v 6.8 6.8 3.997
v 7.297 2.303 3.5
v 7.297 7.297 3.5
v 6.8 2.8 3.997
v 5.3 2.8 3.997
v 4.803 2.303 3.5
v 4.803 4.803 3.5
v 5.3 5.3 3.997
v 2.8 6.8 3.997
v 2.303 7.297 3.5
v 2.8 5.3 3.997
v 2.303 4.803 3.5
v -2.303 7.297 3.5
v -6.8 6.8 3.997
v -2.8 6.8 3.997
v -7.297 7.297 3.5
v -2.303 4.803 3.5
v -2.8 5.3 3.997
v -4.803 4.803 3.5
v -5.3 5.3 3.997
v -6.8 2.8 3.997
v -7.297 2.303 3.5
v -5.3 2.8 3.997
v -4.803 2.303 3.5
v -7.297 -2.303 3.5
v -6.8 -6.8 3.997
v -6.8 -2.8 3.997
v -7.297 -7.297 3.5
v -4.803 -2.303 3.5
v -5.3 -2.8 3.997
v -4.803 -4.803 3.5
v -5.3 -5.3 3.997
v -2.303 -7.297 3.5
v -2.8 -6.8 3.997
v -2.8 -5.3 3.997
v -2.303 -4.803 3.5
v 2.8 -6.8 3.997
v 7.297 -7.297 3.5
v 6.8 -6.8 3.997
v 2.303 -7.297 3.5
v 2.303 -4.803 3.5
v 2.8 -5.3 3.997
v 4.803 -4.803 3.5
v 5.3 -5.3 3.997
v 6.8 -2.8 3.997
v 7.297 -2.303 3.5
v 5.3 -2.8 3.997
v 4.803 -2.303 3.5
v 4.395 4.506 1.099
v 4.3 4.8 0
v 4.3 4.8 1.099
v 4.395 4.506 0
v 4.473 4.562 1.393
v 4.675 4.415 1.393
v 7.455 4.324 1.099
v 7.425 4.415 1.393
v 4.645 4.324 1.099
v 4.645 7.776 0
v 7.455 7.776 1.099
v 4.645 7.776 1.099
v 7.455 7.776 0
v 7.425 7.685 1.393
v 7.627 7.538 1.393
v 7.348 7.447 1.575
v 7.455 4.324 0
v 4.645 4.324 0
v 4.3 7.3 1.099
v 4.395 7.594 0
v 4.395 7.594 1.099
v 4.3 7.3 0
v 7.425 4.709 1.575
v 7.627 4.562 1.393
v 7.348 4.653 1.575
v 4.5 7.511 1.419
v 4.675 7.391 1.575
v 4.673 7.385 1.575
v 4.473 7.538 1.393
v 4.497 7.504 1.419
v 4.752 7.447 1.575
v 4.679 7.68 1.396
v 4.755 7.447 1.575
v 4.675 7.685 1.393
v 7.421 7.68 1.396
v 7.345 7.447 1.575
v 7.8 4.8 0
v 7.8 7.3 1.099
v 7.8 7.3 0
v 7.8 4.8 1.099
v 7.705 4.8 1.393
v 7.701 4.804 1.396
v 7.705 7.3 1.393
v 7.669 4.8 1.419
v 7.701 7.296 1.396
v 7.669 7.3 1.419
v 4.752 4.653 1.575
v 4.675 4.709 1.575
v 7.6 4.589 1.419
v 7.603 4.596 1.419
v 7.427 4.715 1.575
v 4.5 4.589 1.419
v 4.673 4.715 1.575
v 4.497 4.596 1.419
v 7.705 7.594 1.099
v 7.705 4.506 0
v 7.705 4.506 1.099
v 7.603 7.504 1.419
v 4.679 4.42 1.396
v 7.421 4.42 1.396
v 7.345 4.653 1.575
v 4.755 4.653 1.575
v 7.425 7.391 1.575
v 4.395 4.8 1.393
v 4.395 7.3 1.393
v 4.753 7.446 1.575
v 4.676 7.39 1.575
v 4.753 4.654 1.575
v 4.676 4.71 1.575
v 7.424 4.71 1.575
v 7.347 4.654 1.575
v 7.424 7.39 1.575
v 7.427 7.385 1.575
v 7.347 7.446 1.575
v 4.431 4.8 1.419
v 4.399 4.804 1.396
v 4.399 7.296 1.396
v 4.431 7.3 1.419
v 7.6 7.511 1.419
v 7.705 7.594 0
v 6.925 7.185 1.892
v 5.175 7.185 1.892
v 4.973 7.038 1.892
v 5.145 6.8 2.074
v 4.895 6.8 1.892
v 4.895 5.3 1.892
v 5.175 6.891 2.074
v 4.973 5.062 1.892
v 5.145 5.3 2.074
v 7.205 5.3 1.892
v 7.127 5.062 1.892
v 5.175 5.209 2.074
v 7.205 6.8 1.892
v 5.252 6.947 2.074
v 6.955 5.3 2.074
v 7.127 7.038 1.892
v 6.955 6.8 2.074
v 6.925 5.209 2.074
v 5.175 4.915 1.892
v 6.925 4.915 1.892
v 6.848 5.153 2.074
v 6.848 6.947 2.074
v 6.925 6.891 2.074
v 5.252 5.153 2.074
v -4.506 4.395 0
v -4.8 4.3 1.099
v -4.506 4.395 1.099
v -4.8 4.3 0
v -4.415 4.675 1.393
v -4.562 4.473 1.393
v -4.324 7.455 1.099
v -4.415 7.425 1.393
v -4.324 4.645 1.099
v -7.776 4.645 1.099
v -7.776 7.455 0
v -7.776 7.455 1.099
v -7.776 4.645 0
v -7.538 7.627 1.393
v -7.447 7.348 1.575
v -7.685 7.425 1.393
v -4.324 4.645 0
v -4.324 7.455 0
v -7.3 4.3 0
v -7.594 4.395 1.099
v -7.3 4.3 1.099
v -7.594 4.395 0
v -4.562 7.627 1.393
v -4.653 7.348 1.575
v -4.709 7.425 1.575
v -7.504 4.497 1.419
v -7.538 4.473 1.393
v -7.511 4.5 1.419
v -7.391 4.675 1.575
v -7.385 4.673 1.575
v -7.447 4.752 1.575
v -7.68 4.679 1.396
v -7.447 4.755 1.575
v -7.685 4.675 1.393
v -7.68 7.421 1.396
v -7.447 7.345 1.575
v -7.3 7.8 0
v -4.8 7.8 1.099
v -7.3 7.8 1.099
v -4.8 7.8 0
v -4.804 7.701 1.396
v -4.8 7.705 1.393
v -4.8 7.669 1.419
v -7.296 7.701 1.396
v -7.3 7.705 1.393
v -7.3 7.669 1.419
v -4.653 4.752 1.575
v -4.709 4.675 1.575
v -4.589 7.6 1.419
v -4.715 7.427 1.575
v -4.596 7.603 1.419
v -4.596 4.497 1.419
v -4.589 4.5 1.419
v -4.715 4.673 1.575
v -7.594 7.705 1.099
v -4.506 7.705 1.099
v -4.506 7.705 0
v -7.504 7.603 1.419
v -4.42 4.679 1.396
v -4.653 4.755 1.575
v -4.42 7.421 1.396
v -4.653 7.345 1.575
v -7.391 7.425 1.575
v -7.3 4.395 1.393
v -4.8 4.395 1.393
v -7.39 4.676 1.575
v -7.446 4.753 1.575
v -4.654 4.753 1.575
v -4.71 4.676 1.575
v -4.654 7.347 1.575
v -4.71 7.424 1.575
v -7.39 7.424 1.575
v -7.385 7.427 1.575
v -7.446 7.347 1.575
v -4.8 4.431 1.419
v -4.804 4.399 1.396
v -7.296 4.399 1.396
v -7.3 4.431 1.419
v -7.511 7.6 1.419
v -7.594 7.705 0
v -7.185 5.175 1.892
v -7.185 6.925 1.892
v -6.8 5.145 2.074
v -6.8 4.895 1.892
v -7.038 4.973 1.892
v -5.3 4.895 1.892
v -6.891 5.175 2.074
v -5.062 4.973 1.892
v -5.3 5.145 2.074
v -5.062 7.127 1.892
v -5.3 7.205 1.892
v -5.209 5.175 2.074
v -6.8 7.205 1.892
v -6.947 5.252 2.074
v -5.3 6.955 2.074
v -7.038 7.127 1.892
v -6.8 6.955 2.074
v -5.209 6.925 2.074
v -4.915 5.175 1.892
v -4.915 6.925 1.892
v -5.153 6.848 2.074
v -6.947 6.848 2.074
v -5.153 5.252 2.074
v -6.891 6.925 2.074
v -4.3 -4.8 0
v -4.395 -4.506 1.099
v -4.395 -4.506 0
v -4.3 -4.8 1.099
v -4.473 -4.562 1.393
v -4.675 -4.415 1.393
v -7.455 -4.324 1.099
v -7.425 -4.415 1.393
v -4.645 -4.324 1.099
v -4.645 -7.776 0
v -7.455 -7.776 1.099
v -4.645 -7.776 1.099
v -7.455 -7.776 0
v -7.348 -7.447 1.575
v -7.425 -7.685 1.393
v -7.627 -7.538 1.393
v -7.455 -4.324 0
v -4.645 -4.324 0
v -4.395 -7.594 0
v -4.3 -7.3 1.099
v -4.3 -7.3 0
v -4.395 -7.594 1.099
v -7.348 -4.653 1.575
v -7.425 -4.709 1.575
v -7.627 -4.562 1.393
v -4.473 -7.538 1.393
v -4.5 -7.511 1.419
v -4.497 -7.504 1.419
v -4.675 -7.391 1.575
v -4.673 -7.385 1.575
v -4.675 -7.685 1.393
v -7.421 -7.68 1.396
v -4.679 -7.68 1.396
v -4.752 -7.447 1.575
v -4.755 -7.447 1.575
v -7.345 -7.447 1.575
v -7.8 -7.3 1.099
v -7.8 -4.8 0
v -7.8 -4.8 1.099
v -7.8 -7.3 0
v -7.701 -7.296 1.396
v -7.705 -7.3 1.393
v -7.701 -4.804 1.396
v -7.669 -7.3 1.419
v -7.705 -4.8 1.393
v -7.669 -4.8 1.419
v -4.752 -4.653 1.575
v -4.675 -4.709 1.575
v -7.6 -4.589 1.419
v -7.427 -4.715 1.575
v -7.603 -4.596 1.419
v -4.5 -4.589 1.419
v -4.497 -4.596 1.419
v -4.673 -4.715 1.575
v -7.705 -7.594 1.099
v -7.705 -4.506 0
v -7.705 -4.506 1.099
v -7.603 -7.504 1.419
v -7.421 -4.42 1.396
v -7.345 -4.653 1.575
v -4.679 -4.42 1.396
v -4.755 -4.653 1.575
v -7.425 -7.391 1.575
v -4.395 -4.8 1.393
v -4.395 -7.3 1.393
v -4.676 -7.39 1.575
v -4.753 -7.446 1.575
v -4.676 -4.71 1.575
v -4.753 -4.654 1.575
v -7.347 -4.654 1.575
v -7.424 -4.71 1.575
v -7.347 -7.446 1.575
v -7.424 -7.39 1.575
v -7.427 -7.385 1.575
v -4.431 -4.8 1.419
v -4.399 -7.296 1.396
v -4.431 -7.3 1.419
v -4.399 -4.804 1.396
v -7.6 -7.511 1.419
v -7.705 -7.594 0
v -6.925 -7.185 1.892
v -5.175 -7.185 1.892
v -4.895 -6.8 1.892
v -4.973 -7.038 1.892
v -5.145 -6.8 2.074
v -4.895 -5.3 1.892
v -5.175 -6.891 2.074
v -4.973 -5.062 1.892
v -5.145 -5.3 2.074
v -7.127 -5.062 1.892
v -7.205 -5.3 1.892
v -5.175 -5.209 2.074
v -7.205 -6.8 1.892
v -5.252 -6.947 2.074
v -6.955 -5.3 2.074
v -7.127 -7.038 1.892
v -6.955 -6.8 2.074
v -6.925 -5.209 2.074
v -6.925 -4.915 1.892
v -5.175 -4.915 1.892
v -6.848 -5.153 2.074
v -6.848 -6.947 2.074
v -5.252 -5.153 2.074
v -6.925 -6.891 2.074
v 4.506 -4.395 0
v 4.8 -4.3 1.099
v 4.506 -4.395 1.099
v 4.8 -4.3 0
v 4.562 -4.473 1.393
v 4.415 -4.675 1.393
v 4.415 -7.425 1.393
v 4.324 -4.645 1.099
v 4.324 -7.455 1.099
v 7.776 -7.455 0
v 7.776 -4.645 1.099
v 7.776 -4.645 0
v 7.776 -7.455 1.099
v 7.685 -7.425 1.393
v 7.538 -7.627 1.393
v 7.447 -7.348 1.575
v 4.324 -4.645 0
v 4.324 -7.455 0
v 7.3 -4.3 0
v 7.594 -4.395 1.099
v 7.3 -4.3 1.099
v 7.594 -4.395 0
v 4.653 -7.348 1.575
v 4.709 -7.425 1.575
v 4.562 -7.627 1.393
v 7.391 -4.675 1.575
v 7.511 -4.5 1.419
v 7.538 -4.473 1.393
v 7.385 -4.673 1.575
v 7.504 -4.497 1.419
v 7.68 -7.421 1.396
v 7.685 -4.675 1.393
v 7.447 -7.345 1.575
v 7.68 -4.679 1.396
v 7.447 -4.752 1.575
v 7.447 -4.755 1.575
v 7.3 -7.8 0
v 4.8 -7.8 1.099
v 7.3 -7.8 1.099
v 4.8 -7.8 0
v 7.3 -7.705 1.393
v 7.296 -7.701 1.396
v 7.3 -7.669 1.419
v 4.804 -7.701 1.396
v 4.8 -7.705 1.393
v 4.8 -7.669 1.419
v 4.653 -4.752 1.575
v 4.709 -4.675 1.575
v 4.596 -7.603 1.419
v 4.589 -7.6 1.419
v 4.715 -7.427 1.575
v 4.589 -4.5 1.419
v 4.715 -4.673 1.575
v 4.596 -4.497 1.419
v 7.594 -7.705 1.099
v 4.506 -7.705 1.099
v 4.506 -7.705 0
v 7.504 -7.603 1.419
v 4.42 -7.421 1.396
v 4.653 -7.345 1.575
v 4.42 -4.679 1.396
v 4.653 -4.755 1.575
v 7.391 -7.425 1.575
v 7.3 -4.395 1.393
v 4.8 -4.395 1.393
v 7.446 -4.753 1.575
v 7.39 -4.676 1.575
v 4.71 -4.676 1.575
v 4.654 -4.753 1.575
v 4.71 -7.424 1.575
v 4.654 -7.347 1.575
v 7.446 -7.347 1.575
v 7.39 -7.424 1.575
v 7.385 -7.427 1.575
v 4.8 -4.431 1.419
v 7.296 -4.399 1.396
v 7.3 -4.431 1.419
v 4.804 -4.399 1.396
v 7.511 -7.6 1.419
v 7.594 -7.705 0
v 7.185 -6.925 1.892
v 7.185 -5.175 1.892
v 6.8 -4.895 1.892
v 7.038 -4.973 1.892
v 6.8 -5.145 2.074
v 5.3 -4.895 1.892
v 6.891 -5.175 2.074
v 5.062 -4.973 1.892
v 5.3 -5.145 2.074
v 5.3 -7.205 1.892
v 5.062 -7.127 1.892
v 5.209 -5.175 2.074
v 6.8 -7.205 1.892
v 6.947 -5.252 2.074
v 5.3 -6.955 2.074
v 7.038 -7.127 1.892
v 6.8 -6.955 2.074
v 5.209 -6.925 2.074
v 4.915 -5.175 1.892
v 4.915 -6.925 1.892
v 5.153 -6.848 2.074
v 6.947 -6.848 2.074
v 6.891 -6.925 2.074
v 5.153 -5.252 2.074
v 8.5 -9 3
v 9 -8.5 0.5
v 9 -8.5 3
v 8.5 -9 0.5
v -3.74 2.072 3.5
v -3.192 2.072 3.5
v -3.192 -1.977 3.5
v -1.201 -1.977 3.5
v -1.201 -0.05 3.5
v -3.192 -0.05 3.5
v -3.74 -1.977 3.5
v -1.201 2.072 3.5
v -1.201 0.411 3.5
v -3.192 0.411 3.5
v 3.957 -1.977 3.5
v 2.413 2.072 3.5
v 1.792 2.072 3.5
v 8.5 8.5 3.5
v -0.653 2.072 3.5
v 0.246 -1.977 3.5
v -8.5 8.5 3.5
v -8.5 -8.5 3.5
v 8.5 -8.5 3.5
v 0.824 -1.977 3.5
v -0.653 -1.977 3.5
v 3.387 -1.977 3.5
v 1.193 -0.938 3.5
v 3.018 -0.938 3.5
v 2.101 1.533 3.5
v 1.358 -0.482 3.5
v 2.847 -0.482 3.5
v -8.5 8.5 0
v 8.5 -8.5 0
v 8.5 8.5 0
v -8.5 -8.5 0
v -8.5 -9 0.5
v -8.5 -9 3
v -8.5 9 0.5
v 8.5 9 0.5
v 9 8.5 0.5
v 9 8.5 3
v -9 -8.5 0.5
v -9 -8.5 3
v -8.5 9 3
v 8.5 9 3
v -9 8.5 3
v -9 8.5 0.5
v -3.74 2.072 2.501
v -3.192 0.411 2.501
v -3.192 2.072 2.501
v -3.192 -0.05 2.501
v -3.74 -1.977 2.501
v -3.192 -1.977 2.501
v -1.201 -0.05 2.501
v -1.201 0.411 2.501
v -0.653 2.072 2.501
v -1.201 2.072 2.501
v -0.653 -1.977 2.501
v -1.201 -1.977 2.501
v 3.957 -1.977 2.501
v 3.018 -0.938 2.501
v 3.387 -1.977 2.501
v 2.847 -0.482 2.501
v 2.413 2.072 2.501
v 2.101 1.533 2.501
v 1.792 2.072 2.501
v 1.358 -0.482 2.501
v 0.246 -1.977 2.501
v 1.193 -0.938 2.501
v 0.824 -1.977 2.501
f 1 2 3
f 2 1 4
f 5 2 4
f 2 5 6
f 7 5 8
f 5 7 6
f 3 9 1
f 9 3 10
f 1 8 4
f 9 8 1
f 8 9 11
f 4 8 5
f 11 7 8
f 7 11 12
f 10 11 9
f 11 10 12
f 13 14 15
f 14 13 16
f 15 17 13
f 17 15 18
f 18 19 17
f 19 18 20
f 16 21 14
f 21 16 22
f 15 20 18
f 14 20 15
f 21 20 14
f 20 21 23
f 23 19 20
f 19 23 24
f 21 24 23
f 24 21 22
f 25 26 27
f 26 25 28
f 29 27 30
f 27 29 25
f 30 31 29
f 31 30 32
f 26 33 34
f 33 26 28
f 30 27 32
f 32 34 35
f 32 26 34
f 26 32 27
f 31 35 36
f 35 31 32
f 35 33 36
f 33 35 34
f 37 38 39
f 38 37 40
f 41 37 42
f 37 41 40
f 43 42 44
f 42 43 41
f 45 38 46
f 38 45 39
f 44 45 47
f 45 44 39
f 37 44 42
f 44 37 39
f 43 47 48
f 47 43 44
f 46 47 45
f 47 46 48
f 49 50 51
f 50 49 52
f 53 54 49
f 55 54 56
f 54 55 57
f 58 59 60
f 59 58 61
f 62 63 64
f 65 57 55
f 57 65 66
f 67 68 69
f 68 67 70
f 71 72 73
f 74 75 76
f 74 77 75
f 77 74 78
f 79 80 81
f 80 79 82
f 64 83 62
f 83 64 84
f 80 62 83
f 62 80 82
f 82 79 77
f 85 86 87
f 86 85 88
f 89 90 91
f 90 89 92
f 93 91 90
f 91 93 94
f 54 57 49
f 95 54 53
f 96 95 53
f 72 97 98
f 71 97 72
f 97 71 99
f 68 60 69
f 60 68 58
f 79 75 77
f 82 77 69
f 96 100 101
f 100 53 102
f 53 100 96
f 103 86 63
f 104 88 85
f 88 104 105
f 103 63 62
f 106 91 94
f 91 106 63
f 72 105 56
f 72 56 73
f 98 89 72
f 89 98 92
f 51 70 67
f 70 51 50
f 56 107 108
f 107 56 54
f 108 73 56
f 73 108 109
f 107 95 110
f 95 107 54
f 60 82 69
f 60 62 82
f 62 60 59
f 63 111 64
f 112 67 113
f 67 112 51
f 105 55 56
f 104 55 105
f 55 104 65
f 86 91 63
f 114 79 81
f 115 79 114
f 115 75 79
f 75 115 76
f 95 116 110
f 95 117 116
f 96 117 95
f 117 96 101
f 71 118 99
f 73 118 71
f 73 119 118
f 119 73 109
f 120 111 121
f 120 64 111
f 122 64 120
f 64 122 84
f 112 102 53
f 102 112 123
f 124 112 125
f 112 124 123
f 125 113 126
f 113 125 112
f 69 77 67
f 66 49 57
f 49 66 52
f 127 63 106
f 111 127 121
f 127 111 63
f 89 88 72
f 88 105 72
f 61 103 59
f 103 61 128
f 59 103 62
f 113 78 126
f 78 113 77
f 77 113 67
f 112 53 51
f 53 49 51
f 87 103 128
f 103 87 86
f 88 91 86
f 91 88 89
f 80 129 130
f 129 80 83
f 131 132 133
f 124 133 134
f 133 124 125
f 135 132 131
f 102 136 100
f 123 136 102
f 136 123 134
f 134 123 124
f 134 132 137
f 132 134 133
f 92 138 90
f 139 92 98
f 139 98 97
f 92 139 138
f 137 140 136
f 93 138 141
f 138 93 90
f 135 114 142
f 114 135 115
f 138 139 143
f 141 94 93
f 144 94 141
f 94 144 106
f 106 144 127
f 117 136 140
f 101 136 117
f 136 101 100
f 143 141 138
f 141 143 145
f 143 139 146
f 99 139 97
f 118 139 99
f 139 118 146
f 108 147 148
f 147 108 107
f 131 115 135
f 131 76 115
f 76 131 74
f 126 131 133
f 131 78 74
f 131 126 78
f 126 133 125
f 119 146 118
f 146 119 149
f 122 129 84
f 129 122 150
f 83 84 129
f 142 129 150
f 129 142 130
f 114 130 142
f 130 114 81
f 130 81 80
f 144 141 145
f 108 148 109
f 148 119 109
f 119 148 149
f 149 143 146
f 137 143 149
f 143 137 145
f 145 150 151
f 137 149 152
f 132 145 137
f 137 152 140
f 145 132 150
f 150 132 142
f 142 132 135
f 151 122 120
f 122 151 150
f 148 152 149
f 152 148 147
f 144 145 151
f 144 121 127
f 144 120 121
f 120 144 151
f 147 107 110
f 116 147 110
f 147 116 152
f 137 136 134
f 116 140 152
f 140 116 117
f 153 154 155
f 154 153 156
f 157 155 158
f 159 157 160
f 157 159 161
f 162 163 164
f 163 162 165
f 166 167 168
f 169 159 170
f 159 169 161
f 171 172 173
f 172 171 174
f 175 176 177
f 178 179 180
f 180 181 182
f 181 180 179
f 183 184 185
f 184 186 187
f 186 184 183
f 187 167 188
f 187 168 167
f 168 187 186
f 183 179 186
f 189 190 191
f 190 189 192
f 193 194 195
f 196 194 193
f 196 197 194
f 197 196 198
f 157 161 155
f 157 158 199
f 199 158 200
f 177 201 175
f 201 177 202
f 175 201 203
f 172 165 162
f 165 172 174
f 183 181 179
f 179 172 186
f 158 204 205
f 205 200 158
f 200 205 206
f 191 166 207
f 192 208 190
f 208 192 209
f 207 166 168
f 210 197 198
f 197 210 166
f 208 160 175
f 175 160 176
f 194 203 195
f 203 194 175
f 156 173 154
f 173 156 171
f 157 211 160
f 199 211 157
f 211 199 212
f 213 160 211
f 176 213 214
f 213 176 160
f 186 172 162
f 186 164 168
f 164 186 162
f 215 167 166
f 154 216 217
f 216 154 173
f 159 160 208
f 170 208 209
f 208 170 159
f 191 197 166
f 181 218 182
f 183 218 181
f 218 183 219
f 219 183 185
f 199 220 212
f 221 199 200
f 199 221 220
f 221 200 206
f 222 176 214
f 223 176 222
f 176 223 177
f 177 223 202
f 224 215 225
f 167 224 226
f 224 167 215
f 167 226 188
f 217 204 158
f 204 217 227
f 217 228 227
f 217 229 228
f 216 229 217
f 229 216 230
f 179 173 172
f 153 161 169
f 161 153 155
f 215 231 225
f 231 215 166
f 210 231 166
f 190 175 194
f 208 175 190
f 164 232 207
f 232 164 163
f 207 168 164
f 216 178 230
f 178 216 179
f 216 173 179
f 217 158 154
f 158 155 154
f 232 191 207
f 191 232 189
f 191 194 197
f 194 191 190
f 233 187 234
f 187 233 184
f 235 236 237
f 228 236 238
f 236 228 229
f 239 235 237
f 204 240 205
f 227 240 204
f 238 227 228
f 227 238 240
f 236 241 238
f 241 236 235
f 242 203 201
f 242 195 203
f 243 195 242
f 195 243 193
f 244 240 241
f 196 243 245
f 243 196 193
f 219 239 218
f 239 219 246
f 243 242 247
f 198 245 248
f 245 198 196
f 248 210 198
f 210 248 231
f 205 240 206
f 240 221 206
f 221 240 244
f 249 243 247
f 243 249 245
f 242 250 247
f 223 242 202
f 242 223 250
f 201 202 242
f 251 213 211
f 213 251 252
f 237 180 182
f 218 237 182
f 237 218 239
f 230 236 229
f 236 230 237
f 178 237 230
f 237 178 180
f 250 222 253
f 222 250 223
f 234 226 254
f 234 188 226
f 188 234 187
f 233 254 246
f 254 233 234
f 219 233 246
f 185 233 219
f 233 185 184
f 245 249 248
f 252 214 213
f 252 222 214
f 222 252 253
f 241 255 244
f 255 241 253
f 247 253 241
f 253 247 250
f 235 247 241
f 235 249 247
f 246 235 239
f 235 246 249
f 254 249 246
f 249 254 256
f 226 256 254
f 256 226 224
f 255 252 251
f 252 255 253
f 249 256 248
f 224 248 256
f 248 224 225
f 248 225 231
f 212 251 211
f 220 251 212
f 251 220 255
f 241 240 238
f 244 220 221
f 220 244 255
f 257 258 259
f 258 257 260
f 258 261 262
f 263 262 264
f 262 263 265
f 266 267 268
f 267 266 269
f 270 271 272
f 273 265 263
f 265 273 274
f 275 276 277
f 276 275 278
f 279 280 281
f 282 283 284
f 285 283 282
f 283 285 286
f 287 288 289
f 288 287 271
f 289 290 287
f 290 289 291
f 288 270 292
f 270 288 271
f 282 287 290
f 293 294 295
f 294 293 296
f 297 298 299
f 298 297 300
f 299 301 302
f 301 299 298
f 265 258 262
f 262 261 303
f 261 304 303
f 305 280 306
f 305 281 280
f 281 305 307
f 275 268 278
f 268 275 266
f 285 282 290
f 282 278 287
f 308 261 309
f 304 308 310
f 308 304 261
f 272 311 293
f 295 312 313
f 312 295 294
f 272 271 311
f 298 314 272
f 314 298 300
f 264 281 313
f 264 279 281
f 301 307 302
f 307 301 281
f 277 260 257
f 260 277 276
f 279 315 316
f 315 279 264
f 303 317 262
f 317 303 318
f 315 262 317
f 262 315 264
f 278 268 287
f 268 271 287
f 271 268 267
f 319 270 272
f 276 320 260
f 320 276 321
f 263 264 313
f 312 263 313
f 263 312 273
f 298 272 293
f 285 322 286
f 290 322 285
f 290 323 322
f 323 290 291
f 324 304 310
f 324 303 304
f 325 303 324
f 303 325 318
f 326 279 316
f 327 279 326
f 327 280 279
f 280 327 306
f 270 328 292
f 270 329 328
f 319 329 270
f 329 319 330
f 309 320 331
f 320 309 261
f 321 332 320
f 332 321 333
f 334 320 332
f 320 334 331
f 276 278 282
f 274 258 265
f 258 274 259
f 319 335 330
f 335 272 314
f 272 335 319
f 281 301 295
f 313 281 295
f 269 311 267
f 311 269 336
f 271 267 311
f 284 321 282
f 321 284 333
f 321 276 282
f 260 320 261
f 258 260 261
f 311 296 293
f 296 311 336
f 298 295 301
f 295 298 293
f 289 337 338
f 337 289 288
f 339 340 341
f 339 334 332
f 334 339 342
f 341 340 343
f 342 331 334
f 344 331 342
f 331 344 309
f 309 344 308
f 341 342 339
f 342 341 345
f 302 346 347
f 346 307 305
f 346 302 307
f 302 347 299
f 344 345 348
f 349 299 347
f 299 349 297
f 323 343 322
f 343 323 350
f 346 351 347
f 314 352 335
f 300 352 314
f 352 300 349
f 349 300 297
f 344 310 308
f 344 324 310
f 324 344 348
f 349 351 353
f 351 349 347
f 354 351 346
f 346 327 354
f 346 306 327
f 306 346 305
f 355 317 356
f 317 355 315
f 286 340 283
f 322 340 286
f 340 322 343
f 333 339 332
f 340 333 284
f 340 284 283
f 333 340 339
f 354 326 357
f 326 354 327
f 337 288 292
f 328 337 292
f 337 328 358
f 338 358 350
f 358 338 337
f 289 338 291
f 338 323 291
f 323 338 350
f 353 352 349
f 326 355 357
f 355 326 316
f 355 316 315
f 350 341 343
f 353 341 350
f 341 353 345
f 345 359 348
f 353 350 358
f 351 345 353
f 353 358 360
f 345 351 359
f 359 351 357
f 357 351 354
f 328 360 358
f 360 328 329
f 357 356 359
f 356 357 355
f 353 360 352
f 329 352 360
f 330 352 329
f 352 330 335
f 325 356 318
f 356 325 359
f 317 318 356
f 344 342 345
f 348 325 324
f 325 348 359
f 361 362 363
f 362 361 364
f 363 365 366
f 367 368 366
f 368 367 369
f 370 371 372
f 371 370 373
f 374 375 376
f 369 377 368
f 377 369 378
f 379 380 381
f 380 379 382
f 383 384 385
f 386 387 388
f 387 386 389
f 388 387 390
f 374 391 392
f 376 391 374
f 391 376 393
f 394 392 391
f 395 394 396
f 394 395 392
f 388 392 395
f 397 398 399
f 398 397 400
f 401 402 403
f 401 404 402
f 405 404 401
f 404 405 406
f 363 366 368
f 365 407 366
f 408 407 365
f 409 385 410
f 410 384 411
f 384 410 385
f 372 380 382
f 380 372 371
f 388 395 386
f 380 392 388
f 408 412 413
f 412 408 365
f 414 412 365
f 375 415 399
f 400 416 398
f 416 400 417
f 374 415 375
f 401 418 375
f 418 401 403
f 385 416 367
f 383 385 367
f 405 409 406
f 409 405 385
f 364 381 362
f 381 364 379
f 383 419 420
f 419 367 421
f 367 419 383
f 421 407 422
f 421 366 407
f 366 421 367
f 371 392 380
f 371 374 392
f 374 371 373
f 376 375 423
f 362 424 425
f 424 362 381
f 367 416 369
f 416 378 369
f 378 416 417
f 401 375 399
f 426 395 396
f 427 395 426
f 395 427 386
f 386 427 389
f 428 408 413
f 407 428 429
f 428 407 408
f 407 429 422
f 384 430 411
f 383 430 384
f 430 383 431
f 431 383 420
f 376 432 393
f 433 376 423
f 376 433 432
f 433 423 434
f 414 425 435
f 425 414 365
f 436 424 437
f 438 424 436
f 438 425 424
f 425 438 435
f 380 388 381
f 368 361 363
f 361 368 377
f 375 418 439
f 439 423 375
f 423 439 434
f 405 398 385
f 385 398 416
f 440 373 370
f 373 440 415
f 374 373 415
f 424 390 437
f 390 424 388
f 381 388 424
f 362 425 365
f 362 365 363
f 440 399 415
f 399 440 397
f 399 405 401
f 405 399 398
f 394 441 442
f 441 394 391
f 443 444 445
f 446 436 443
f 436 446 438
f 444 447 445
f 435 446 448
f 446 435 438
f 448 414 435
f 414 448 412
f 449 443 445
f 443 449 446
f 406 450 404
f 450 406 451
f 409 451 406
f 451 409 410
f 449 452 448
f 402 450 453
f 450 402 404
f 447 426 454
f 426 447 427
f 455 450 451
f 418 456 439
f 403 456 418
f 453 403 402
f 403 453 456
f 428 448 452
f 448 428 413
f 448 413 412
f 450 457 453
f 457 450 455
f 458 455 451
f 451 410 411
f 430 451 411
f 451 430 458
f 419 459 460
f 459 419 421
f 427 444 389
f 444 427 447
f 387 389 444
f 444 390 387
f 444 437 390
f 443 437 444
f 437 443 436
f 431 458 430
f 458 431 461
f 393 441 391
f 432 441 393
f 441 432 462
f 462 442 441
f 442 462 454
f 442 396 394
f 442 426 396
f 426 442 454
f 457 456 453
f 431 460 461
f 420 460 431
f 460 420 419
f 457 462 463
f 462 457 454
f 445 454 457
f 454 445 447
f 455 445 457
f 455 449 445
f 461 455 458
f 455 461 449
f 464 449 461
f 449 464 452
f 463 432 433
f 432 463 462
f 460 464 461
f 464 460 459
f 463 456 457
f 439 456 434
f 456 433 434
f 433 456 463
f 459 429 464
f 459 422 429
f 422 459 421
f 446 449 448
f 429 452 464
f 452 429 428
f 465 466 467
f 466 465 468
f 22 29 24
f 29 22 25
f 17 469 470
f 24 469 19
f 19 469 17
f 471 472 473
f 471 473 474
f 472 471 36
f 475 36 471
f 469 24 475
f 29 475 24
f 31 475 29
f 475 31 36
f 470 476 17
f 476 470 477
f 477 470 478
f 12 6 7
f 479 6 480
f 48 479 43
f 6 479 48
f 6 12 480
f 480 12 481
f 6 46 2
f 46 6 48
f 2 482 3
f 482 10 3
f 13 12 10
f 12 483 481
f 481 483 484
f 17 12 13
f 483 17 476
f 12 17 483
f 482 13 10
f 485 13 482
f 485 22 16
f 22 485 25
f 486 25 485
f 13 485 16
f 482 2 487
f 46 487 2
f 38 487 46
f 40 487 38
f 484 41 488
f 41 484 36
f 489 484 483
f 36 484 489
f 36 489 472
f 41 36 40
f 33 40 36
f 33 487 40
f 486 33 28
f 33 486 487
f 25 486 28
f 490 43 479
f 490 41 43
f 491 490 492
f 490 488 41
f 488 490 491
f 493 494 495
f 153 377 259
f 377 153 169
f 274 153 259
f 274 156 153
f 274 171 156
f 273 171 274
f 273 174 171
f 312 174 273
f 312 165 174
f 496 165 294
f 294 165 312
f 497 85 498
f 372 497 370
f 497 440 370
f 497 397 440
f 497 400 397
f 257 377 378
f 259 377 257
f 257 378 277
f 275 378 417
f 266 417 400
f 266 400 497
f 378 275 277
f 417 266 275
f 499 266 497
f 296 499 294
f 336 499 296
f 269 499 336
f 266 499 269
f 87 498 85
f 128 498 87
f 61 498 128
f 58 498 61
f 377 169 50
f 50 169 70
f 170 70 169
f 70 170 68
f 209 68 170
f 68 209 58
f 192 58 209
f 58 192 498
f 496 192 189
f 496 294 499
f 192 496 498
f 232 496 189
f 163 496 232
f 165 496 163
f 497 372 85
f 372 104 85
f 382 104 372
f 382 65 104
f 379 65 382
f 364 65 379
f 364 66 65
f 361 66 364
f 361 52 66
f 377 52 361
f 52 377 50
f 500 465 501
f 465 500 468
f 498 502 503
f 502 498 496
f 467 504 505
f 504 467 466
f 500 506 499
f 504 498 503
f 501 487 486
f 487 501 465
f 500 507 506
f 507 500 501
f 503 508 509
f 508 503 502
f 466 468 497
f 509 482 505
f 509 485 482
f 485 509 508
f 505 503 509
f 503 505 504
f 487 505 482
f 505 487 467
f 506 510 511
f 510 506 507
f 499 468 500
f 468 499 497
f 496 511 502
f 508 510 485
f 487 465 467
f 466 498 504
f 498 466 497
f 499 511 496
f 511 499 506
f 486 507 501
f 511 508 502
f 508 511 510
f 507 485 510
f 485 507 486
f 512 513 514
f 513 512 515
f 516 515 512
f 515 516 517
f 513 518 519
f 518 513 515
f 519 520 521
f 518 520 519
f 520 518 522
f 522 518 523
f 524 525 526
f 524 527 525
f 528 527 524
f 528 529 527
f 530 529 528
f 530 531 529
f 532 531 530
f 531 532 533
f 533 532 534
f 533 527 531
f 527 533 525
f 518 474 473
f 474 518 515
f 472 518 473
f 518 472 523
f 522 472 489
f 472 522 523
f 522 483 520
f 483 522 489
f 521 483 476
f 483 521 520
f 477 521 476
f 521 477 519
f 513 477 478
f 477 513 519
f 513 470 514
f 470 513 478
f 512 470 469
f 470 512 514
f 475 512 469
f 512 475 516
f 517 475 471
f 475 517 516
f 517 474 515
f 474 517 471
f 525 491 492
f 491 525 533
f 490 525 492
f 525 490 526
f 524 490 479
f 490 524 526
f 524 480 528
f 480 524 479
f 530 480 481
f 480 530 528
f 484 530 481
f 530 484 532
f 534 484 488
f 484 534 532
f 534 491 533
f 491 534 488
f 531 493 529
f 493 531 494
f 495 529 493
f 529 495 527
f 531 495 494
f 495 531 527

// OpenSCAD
// file: common.scad
// Unless otherwise specified, each resulting shape is
// resting on the XY plane, centered on the Z axis.

// A small amount to make sure shapes overlap when needed. This
// is well below the resolution of my 3D printer, so it
// shouldn't affect the final result.
eps = 0.001;

// High quality for printing.
$fa = 5;
$fs = 0.4;

module repeatx(n, spacing) {
  for (i = [1:n])
    translate([(i-1)*spacing, 0, 0])
      children();
}

module repeaty(n, spacing) {
  for (i = [1:n])
    translate([0, (i-1)*spacing, 0])
      children();
}

// A square pyramid, 1mm wide and 0.5mm tall. Each side of
// the base is centered on an axis.
module pyramid() {
  linear_extrude(0.5, scale=0)
    square(1, center=true);
}

// A regular octahedron centered on the origin with its
// vertices on the axes. 'axis' gives its full length along
// each axis.
module octahedron(axis) {
  // Top and bottom halves.
  for (a = [-1, 1])
    scale([1, 1, a])
      // Extrude a square into a pyramid.
      linear_extrude(axis/2, scale=0)
        rotate([0, 0, 45])
          square(norm([axis/2, axis/2]), center=true);
}

// 'd' is the outer dimensions of the box.
module chamfered_box(d) {
  chamfer = 0.5;
  assert(d.x >= chamfer*2);
  assert(d.y >= chamfer*2);
  assert(d.z >= chamfer*2);

  // Raise the result up so it is resting on the XY plane.
  translate([0, 0, d.z/2]) {
    minkowski() {
      // The desired cube, scaled back by the chamfer distance
      // in all directions.
      cube(d - [chamfer*2, chamfer*2, chamfer*2], center=true);
      octahedron(chamfer*2);
    }
  }
}

module chamfered_disk(height, radius) {
  // Chamfer base disks and chips more aggressively.
  chamfer = 1.1;
  assert(radius >= chamfer);
  assert(height >= chamfer*2);

  // Raise the result up so it is resting on the XY plane.
  translate([0, 0, height/2]) {
    minkowski() {
      // The desired disk, scaled back by the chamfer distance
      // in all directions.
      cylinder(height-chamfer*2, r=radius-chamfer, center=true);
      octahedron(chamfer*2);
    }
  }
}

locking_lug_dims = [2.3, 2.3, 1.8+2*eps];

// A snug fit for gluing.
module locking_lug() {
  // Taper the lug slightly, to counteract the printing effect
  // which spreads the top layer slightly.
  linear_extrude(locking_lug_dims.z, scale=0.95)
    square([locking_lug_dims.x, locking_lug_dims.y],
            center=true);
}

// Make extra sure the lug will fit all the way into the hole.
locking_socket_extra_depth = 0.7;

module locking_socket_top() {
  translate([
    0, 0,
    -(locking_lug_dims.z+locking_socket_extra_depth)/2+eps
  ]) {
    cube(locking_lug_dims + [
      0.15, 0.15,
      locking_socket_extra_depth
    ], center=true);
  }
}

module locking_socket_bottom() {
  translate([
    0, 0,
    (locking_lug_dims.z+locking_socket_extra_depth)/2-eps
  ]) {
    cube(locking_lug_dims + [
      // When printing this on the bottom of a model, it
      // needs to be a bit wider to account for
      // elephant-foot.
      0.3, 0.3,
      locking_socket_extra_depth
    ], center=true);
  }
}

// A pin which can be used to join two locking sockets.
module locking_pin() {
  dims = [
    locking_lug_dims.x-0.2,
    // Lay the pin on its side for more reliable printing.
    locking_lug_dims.z*2 + locking_socket_extra_depth/2,
    locking_lug_dims.y-0.2,
  ];
  translate([0, 0, dims.z/2])
    cube(dims, center=true);
}
// main file
include <common.scad>

// Studs are 1.6mm high and 2.5mm across.
stud_width = 2.5;

// Studs are spaced 1.7mm in from the edges of an 18x18mm
// square.
stud_inset = 1.7;

// 45 degree beveled top, 0.5mm high.
module stud_top(dims) {
  hull() {
    for (a = [-1, 1], b = [-1, 1]) {
      translate([
        a*(dims.x/2-0.5), b*(dims.y/2-0.5), 0
      ]) {
        pyramid();
      }
    }
  }
}

module stud_piece(dims, column_height) {
  assert(dims.x >= 1);
  assert(dims.y >= 1);
  
  // Rectangular column.
  translate([0, 0, -eps])
    linear_extrude(column_height)
      square(dims, center=true);
  
  // Beveled top.
  translate([0, 0, column_height-2*eps])
    stud_top(dims);
  
  // Beveled bottom, in case any material under the stud
  // is etched away (by the face mask, for instance).
  scale([1, 1, -1])
    stud_top(dims);
}

NO_STUD = 0;
SMALL_STUD = 1;
SMALL_SHORT_STUD = 2;
LARGE_STUD = 3;
LARGE_SHORT_STUD = 4;

module stud(type=NO_STUD) {
  if (type == NO_STUD) {
    // Nothing.
    
  } else if (type == SMALL_STUD ||
             type == SMALL_SHORT_STUD) {
    c = type == SMALL_STUD ? 1.1 : 0;
    stud_piece([stud_width, stud_width], c);
    
  } else if (type == LARGE_STUD ||
             type == LARGE_SHORT_STUD) {
    c = type == LARGE_STUD ? 1.1 : 0;

    // Build an L-shaped stud out of two elongated pieces.
    translate([0, -stud_width/2, 0])
      stud_piece([stud_width, stud_width*2], c);
    translate([-stud_width/2, 0, 0])
      stud_piece([stud_width*2, stud_width], c);
    
  } else {
    assert(false, "bad stud type");
  }
}

module four_studs() {
  displacement = (18/2)-(stud_width/2)-stud_inset;  
  for (a = [0:3])
    rotate([0, 0, a*90])
      translate([displacement, displacement, 0])
        children();
}

// A stackable box, 18x18mm, with optional studs and holes.
module stackable_box(
  height, stud_type=NO_STUD, hole_type=NO_STUD
) {
  translate([0, 0, height - eps]) {
    four_studs()
      stud(stud_type);
  }

  difference() {
    chamfered_box([18, 18, height]);
    
    if (hole_type != NO_STUD) {
      four_studs() {
        // This check is required because minkowski() returns
        // a nonempty result if just one of its arguments is
        // empty.
        minkowski() {
          stud(hole_type);
          sphere(r=0.5, $fn=10);
        }
      }
    }
  }
}

// A head, which is intended to have 2 chips stacked on top.
module head(face_raster) {
  difference() {
    // A 10mm head plus two 3.5mm chips comes to 17mm,
    // which is slightly less than the 18mm width. That's
    // by design. It looks better not to have such tall 
    // heads, perhaps because the studs on top give the
    // illusion of added height.
    chamfered_box([18, 18, 10]);
    
    // Bring the mask out a bit extra to avoid having it 
    // intersect the studs at all.
    translate([0, -9, 0])
      face(face_raster);
    
    // A socket for gluing to a body.
    locking_socket_bottom();
  }
  
  // Add the studs separately, so they are not gouged by
  // the face engraving.
  translate([0, 0, 10 - eps]) {
    four_studs()
      stud(SMALL_STUD);
  }
}

// 'raster' is an array of 5 rows, where each row has 8
// elements. Each element should be in [0, 1]. A '1' means the
// given position will be fully engraved on the face.
// Returns a mask which should be subtracted from the head.
// The Z axis will coincide with the centerline of the 
// mask's front.
module face(raster) {
  // Below we use a unit of 1 to represent one pixel on
  // the face. Scale up to an 18mm face, 8 pixels wide.
  scale([2.25, 2.25, 2.25]) {
    translate([-4, -eps, -eps]) {
      difference() {
        // Begin with a filled-in face plate.
        translate([-eps, -eps, -eps])
          cube([8+2*eps, 0.9+2*eps, 5+2*eps]);
        
        // Subtract the material which needs to remain on the
        // head. Leave some support under each shelf.
        for (r = [0:4])
          for (c = [0:7])
            translate([c-eps, raster[r][c]-eps, 4-r-eps])
              rotate([90, 0, 90])
                translate([0, 0, -2*eps])
                  linear_extrude(1+4*eps)
                    polygon([
                      [   -2*eps,     -2*eps],
                      [0.9+2*eps, -0.5-2*eps],
                      [0.9+2*eps,    1+2*eps],
                      [   -2*eps,    1+2*eps],
                    ]);
      }
    }
  }
}

module text_engrave(s) {
  depth = 1;
  translate([0, 0, -depth+eps])
    linear_extrude(depth)
      text(
        text=s,
        size=4,
        font="DejaVu Sans",
        halign="center",
        valign="center",
        spacing=1.1);
}

module creeper_head() {
  head([
    [0, 1, 1, 0, 0, 1, 1, 0],
    [0, 1, 1, 0, 0, 1, 1, 0],
    [0, 0, 0, 1, 1, 0, 0, 0],
    [0, 0, 1, 1, 1, 1, 0, 0],
    [0, 0, 1, 0, 0, 1, 0, 0],
  ]);
}

module zombie_head() {
  head([
    [0.0, 0.0, 0.0, 0.0, 0.0, 0.0, 0.0, 0.0],
    [0.0, 1.0, 1.0, 0.0, 0.0, 1.0, 1.0, 0.0],
    [0.0, 0.0, 0.0, 0.8, 0.8, 0.0, 0.0, 0.0],
    [0.0, 0.0, 0.2, 0.2, 0.2, 0.2, 0.0, 0.0],
    [0.0, 0.0, 0.2, 0.2, 0.2, 0.2, 0.0, 0.0],
  ]);
}

module skeleton_head() {
  head([
    [0, 0, 0, 0, 0, 0, 0, 0],
    [0, 1, 1, 0, 0, 1, 1, 0],
    [0, 0, 0, 1, 1, 0, 0, 0],
    [0, 1, 1, 1, 1, 1, 1, 0],
    [0, 0, 0, 0, 0, 0, 0, 0],
  ]);
}

module spider_head() {
  head([
    [1, 0, 0, 0, 0, 0, 0, 1],
    [1, 0, 1, 1, 1, 1, 0, 1],
    [0, 0, 1, 1, 1, 1, 0, 0],
    [0, 0, 0, 0, 0, 0, 0, 0],
    [0, 0, 1, 0, 0, 1, 0, 0],
  ]);
}

module steve_head() {
  head([
    [0, 0, 0, 0, 0, 0, 0, 0],
    [0, 0.7, 1, 0, 0, 1, 0.7, 0],
    [0, 0, 0, 0.8, 0.8, 0, 0, 0],
    [0, 0, 1, 0, 0, 1, 0, 0],
    [0, 0, 1, 1, 1, 1, 0, 0],
  ]);
}

// Heavy armor cannot stack on a heavy weapon.
module light_weapon() {
  difference() {
    stackable_box(3.5, SMALL_STUD, SMALL_STUD);
    translate([0, 0, 3.5]) text_engrave("LW");
  }
}
module heavy_weapon() {
  difference() {
    stackable_box(3.5, LARGE_STUD, SMALL_STUD);
    translate([0, 0, 3.5]) text_engrave("HW");
  }
}
module light_armor() {
  difference() {
    stackable_box(3.5, SMALL_SHORT_STUD, LARGE_STUD);
    translate([0, 0, 3.5]) text_engrave("LA");
  }
}
module heavy_armor() {
  difference() {
    stackable_box(3.5, LARGE_SHORT_STUD, SMALL_STUD);
    translate([0, 0, 3.5]) text_engrave("HA");
  }
}

// Status effect chips go between the weapon and head.
// So their top and bottom match the head's top.
module status_effect() {
  stackable_box(3.5, SMALL_STUD, SMALL_STUD);
}

// Demo.
heavy_armor();
